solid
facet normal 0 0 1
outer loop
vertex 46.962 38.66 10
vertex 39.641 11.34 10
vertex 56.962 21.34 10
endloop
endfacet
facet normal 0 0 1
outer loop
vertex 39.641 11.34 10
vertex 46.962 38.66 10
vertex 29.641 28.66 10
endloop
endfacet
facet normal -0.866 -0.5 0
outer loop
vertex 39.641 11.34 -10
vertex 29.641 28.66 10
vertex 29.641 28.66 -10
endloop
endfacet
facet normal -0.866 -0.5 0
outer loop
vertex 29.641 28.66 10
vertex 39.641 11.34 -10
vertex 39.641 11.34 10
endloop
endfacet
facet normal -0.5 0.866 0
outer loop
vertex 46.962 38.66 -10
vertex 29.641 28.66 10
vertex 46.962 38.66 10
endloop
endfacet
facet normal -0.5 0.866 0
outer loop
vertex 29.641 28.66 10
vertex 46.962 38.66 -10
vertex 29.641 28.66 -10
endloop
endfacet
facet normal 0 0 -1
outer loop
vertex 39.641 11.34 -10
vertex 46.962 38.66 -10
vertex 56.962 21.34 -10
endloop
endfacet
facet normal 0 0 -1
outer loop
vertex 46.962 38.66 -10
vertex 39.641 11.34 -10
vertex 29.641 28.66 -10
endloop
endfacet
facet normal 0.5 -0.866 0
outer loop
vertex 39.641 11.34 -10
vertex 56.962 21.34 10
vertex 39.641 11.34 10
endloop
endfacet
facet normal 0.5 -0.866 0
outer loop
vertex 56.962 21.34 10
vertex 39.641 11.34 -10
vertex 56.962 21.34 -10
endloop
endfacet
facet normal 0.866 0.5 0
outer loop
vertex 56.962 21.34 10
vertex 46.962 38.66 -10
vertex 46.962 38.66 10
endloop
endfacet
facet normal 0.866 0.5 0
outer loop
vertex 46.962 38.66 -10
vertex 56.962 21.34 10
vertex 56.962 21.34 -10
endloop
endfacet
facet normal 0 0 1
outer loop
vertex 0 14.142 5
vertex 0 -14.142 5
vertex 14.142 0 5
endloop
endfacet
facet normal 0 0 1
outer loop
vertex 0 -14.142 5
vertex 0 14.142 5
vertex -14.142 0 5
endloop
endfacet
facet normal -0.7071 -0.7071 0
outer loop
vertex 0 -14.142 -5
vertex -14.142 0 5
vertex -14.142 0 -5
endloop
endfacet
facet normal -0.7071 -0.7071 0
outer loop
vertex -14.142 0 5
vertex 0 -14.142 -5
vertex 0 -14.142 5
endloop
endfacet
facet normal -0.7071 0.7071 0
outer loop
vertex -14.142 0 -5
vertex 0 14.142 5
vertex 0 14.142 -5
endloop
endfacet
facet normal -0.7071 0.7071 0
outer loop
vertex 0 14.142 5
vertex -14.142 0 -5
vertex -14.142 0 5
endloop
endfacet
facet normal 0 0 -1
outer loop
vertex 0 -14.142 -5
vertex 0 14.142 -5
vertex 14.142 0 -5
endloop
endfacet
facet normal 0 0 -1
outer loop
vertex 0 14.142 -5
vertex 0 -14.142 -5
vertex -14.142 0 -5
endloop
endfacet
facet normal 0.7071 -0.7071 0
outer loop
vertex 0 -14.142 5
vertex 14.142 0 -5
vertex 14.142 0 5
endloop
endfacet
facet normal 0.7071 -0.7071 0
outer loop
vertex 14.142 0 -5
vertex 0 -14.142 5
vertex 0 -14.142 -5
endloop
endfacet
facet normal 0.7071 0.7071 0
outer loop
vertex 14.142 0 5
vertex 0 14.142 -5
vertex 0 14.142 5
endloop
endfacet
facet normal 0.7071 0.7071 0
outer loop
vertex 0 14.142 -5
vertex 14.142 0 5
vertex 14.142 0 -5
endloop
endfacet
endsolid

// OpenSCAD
// --Ejemplo de traslación y rotación

// --Traslación y rotación de un cubo
rotate([0,0,30])
    translate([50,0,0])
        cube([20,20,20],center=true);
        
// --Rotación de un cubo
rotate([0,0,45])
    cube([20,20,10],center=true);
